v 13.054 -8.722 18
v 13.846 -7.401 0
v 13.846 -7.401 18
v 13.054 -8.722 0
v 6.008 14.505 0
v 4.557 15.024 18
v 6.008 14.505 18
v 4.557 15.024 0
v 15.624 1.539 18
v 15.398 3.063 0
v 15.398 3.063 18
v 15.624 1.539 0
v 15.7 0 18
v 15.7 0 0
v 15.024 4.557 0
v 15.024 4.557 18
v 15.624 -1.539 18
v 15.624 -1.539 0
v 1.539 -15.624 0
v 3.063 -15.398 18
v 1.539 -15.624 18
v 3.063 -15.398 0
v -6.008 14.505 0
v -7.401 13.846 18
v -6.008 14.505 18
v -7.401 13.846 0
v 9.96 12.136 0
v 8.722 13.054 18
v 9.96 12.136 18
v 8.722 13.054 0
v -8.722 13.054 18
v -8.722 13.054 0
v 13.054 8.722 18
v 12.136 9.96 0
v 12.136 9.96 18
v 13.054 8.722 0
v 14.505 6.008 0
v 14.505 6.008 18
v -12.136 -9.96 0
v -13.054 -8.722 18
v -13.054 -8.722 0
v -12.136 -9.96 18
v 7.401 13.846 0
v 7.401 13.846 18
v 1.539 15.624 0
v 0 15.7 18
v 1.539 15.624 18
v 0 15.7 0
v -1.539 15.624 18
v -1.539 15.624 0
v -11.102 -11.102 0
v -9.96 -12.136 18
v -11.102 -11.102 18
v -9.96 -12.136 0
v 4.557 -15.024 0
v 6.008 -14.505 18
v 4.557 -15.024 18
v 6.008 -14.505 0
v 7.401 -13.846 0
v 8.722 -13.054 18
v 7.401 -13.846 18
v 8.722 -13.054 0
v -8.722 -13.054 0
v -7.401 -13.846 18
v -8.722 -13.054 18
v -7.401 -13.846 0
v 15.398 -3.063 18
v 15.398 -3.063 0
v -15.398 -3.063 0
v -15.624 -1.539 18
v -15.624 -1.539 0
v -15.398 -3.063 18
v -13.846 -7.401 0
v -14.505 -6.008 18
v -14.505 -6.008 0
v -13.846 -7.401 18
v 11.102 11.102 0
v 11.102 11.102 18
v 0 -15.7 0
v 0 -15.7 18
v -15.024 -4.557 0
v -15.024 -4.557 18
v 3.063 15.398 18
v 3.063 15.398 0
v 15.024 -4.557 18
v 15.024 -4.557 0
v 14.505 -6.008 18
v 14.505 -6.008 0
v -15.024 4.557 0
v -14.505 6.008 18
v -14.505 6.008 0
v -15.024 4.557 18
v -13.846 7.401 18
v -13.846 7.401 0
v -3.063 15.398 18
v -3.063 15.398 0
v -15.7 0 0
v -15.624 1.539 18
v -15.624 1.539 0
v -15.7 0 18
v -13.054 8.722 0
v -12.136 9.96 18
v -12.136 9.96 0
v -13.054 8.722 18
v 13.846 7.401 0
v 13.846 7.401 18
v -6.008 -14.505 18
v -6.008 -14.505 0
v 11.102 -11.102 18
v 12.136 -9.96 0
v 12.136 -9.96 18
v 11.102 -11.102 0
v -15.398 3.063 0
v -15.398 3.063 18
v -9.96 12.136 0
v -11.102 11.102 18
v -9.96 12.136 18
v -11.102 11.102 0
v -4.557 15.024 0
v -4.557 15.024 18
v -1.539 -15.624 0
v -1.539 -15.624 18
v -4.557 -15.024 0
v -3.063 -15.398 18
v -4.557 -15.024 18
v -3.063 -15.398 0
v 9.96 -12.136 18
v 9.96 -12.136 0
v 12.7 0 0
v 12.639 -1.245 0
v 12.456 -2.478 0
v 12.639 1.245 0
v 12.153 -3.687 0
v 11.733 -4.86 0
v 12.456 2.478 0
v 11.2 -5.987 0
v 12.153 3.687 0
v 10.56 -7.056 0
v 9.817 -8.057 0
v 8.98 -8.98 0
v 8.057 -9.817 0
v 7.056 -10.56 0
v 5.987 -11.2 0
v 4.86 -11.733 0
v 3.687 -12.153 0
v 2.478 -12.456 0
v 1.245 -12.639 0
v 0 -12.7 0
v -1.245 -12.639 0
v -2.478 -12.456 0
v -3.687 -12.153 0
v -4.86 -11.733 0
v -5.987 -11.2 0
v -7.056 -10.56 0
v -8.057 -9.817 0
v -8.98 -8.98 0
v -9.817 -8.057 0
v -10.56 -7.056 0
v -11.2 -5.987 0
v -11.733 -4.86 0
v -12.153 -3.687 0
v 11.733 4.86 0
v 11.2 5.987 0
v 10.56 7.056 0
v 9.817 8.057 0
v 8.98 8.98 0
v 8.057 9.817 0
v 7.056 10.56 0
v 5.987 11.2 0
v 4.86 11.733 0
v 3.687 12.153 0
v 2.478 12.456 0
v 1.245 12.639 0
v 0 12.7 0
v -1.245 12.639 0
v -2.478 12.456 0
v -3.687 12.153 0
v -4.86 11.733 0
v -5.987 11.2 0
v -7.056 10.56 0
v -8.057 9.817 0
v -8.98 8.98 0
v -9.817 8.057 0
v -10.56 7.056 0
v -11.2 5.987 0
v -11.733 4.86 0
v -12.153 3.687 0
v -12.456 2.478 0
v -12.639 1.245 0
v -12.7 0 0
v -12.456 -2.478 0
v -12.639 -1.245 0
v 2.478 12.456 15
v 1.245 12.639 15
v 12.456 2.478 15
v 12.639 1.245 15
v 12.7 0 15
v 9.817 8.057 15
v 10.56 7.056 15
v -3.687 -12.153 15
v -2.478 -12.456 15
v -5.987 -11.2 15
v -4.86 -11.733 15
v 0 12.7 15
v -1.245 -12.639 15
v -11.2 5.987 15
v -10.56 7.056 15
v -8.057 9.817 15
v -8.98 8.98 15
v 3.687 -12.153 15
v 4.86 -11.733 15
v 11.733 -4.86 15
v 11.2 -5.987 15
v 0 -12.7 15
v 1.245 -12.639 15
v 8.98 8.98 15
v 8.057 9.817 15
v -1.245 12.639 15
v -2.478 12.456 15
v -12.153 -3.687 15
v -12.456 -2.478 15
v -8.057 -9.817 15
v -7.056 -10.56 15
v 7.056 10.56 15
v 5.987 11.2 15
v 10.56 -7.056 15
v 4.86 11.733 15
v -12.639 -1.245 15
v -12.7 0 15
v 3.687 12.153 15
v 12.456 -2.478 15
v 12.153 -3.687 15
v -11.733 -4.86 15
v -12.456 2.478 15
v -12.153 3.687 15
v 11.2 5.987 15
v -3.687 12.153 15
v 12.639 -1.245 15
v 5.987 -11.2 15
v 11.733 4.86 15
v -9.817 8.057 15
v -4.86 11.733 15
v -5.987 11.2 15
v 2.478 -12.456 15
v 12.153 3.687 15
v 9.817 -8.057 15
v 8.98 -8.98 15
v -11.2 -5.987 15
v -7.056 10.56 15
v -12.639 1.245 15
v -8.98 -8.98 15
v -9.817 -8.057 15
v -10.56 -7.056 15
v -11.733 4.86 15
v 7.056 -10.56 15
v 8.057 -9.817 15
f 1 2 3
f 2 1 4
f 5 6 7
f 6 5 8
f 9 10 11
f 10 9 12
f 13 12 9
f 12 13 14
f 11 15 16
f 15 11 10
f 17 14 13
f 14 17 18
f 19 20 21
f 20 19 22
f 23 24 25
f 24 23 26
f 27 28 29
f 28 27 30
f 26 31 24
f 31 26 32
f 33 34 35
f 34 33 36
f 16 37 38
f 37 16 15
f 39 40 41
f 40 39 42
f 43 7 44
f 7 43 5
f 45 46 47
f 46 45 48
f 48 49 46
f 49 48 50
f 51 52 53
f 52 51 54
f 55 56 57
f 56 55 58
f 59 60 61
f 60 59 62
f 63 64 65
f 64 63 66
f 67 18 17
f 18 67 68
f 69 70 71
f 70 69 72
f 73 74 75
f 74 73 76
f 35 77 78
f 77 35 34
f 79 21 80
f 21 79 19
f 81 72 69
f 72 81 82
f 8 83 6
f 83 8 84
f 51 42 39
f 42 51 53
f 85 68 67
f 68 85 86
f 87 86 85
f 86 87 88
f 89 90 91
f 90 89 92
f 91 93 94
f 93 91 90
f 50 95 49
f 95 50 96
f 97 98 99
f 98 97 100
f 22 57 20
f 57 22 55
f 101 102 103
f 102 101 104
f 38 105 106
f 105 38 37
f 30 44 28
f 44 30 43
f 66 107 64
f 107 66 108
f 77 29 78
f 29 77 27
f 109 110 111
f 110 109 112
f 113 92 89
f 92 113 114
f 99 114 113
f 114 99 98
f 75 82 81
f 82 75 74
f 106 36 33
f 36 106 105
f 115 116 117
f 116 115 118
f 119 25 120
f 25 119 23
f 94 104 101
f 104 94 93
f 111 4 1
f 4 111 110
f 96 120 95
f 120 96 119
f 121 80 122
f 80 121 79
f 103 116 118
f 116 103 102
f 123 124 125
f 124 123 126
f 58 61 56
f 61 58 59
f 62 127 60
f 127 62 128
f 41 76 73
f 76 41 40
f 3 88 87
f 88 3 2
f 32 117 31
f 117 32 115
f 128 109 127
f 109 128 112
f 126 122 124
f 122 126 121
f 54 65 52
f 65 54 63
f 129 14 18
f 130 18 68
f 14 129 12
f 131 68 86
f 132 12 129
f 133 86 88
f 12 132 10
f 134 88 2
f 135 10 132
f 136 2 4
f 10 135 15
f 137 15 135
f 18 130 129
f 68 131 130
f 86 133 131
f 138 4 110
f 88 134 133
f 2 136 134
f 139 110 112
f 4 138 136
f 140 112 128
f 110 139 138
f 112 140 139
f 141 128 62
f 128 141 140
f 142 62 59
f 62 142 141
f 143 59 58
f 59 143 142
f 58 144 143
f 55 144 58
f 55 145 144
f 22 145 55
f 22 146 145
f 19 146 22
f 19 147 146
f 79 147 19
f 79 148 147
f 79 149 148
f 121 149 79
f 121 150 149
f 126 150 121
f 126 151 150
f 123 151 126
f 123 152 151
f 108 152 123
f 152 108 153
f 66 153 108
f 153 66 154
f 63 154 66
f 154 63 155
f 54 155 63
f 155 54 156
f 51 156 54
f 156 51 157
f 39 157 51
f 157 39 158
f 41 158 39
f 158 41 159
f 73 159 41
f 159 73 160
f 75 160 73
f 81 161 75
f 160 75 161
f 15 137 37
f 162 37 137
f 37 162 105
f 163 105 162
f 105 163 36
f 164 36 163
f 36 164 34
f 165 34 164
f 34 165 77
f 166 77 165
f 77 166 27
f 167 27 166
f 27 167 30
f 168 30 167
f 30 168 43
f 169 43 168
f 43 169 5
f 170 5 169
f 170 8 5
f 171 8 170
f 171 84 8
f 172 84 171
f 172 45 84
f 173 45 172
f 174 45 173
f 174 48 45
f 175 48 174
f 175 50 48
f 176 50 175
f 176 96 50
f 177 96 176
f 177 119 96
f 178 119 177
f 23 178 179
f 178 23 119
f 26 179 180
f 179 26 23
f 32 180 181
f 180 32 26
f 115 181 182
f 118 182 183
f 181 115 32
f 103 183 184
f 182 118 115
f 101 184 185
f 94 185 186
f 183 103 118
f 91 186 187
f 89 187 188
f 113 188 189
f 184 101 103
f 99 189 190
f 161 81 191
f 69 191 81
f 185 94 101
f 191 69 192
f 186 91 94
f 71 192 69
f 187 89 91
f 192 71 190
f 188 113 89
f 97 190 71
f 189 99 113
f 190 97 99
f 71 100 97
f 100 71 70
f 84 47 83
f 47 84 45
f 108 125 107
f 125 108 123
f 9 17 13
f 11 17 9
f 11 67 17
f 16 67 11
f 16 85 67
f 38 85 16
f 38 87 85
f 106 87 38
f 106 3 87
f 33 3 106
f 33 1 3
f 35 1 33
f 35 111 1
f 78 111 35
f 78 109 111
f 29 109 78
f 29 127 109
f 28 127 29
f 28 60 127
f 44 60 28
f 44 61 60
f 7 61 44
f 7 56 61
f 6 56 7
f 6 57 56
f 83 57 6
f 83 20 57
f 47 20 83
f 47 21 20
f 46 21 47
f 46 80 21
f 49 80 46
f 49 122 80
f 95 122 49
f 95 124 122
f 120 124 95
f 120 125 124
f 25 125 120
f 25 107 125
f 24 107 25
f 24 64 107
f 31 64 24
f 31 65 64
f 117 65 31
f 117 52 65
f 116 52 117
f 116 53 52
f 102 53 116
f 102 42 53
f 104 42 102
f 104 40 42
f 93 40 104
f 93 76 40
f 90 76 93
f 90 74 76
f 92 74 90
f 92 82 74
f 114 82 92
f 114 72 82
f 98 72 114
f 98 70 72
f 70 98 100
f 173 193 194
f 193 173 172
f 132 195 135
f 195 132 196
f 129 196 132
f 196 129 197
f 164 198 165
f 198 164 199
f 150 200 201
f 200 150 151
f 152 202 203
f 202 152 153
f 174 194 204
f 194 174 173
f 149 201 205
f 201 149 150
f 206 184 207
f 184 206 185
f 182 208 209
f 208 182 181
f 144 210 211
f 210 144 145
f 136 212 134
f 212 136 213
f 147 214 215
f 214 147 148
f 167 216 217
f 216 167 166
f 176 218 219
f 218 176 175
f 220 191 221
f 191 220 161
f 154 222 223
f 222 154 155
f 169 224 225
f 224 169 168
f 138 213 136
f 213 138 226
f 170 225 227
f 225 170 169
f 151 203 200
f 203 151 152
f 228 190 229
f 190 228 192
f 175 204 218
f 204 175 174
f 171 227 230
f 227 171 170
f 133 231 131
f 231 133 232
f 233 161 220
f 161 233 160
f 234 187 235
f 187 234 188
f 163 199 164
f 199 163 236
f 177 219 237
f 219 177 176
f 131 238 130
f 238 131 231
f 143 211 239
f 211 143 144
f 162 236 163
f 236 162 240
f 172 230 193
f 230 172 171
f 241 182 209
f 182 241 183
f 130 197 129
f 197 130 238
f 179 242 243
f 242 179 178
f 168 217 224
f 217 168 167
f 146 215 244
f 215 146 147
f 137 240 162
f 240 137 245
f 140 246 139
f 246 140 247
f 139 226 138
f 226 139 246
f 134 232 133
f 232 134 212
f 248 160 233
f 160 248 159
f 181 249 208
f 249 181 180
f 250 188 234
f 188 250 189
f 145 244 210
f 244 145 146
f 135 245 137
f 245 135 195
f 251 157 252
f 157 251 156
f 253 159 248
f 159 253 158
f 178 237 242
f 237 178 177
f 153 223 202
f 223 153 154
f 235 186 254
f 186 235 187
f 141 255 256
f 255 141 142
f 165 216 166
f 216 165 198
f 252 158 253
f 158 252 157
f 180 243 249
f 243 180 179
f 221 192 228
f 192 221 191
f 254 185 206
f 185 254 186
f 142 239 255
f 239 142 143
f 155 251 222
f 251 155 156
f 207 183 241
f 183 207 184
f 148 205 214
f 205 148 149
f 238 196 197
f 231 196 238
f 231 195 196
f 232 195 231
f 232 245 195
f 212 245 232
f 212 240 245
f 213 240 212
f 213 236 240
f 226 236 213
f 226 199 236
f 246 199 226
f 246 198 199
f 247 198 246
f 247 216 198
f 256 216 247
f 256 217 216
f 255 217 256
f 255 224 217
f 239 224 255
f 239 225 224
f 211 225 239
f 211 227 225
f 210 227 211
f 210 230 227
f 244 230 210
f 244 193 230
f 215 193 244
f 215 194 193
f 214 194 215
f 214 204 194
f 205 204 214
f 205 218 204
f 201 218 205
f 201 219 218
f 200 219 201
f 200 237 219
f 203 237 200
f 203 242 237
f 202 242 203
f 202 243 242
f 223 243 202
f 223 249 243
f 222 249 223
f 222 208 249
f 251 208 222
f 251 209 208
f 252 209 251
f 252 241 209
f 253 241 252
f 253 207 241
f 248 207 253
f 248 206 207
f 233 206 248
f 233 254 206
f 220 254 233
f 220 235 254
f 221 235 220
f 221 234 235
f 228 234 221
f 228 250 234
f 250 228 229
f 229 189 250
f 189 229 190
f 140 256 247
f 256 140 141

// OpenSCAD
// Parametric Pipe Cap (end seal)
// Parameters are injected via OpenSCAD -D flags

// Pipe inner diameter (mm) - cap fits over the pipe
pipe_id = 25.4;
// Wall thickness (mm)
wall_thickness = 3;
// Cap depth / how far it slides onto the pipe (mm)
depth = 15;
// Resolution
$fn = 64;

pipe_od = pipe_id + 2 * wall_thickness;

module cap() {
    difference() {
        // Outer shell: cylinder + dome top
        union() {
            cylinder(h = depth, d = pipe_od);
            translate([0, 0, depth])
                cylinder(h = wall_thickness, d = pipe_od);
        }

        // Inner bore (open at bottom, closed at top)
        translate([0, 0, -0.1])
            cylinder(h = depth + 0.1, d = pipe_id);
    }
}

cap();
